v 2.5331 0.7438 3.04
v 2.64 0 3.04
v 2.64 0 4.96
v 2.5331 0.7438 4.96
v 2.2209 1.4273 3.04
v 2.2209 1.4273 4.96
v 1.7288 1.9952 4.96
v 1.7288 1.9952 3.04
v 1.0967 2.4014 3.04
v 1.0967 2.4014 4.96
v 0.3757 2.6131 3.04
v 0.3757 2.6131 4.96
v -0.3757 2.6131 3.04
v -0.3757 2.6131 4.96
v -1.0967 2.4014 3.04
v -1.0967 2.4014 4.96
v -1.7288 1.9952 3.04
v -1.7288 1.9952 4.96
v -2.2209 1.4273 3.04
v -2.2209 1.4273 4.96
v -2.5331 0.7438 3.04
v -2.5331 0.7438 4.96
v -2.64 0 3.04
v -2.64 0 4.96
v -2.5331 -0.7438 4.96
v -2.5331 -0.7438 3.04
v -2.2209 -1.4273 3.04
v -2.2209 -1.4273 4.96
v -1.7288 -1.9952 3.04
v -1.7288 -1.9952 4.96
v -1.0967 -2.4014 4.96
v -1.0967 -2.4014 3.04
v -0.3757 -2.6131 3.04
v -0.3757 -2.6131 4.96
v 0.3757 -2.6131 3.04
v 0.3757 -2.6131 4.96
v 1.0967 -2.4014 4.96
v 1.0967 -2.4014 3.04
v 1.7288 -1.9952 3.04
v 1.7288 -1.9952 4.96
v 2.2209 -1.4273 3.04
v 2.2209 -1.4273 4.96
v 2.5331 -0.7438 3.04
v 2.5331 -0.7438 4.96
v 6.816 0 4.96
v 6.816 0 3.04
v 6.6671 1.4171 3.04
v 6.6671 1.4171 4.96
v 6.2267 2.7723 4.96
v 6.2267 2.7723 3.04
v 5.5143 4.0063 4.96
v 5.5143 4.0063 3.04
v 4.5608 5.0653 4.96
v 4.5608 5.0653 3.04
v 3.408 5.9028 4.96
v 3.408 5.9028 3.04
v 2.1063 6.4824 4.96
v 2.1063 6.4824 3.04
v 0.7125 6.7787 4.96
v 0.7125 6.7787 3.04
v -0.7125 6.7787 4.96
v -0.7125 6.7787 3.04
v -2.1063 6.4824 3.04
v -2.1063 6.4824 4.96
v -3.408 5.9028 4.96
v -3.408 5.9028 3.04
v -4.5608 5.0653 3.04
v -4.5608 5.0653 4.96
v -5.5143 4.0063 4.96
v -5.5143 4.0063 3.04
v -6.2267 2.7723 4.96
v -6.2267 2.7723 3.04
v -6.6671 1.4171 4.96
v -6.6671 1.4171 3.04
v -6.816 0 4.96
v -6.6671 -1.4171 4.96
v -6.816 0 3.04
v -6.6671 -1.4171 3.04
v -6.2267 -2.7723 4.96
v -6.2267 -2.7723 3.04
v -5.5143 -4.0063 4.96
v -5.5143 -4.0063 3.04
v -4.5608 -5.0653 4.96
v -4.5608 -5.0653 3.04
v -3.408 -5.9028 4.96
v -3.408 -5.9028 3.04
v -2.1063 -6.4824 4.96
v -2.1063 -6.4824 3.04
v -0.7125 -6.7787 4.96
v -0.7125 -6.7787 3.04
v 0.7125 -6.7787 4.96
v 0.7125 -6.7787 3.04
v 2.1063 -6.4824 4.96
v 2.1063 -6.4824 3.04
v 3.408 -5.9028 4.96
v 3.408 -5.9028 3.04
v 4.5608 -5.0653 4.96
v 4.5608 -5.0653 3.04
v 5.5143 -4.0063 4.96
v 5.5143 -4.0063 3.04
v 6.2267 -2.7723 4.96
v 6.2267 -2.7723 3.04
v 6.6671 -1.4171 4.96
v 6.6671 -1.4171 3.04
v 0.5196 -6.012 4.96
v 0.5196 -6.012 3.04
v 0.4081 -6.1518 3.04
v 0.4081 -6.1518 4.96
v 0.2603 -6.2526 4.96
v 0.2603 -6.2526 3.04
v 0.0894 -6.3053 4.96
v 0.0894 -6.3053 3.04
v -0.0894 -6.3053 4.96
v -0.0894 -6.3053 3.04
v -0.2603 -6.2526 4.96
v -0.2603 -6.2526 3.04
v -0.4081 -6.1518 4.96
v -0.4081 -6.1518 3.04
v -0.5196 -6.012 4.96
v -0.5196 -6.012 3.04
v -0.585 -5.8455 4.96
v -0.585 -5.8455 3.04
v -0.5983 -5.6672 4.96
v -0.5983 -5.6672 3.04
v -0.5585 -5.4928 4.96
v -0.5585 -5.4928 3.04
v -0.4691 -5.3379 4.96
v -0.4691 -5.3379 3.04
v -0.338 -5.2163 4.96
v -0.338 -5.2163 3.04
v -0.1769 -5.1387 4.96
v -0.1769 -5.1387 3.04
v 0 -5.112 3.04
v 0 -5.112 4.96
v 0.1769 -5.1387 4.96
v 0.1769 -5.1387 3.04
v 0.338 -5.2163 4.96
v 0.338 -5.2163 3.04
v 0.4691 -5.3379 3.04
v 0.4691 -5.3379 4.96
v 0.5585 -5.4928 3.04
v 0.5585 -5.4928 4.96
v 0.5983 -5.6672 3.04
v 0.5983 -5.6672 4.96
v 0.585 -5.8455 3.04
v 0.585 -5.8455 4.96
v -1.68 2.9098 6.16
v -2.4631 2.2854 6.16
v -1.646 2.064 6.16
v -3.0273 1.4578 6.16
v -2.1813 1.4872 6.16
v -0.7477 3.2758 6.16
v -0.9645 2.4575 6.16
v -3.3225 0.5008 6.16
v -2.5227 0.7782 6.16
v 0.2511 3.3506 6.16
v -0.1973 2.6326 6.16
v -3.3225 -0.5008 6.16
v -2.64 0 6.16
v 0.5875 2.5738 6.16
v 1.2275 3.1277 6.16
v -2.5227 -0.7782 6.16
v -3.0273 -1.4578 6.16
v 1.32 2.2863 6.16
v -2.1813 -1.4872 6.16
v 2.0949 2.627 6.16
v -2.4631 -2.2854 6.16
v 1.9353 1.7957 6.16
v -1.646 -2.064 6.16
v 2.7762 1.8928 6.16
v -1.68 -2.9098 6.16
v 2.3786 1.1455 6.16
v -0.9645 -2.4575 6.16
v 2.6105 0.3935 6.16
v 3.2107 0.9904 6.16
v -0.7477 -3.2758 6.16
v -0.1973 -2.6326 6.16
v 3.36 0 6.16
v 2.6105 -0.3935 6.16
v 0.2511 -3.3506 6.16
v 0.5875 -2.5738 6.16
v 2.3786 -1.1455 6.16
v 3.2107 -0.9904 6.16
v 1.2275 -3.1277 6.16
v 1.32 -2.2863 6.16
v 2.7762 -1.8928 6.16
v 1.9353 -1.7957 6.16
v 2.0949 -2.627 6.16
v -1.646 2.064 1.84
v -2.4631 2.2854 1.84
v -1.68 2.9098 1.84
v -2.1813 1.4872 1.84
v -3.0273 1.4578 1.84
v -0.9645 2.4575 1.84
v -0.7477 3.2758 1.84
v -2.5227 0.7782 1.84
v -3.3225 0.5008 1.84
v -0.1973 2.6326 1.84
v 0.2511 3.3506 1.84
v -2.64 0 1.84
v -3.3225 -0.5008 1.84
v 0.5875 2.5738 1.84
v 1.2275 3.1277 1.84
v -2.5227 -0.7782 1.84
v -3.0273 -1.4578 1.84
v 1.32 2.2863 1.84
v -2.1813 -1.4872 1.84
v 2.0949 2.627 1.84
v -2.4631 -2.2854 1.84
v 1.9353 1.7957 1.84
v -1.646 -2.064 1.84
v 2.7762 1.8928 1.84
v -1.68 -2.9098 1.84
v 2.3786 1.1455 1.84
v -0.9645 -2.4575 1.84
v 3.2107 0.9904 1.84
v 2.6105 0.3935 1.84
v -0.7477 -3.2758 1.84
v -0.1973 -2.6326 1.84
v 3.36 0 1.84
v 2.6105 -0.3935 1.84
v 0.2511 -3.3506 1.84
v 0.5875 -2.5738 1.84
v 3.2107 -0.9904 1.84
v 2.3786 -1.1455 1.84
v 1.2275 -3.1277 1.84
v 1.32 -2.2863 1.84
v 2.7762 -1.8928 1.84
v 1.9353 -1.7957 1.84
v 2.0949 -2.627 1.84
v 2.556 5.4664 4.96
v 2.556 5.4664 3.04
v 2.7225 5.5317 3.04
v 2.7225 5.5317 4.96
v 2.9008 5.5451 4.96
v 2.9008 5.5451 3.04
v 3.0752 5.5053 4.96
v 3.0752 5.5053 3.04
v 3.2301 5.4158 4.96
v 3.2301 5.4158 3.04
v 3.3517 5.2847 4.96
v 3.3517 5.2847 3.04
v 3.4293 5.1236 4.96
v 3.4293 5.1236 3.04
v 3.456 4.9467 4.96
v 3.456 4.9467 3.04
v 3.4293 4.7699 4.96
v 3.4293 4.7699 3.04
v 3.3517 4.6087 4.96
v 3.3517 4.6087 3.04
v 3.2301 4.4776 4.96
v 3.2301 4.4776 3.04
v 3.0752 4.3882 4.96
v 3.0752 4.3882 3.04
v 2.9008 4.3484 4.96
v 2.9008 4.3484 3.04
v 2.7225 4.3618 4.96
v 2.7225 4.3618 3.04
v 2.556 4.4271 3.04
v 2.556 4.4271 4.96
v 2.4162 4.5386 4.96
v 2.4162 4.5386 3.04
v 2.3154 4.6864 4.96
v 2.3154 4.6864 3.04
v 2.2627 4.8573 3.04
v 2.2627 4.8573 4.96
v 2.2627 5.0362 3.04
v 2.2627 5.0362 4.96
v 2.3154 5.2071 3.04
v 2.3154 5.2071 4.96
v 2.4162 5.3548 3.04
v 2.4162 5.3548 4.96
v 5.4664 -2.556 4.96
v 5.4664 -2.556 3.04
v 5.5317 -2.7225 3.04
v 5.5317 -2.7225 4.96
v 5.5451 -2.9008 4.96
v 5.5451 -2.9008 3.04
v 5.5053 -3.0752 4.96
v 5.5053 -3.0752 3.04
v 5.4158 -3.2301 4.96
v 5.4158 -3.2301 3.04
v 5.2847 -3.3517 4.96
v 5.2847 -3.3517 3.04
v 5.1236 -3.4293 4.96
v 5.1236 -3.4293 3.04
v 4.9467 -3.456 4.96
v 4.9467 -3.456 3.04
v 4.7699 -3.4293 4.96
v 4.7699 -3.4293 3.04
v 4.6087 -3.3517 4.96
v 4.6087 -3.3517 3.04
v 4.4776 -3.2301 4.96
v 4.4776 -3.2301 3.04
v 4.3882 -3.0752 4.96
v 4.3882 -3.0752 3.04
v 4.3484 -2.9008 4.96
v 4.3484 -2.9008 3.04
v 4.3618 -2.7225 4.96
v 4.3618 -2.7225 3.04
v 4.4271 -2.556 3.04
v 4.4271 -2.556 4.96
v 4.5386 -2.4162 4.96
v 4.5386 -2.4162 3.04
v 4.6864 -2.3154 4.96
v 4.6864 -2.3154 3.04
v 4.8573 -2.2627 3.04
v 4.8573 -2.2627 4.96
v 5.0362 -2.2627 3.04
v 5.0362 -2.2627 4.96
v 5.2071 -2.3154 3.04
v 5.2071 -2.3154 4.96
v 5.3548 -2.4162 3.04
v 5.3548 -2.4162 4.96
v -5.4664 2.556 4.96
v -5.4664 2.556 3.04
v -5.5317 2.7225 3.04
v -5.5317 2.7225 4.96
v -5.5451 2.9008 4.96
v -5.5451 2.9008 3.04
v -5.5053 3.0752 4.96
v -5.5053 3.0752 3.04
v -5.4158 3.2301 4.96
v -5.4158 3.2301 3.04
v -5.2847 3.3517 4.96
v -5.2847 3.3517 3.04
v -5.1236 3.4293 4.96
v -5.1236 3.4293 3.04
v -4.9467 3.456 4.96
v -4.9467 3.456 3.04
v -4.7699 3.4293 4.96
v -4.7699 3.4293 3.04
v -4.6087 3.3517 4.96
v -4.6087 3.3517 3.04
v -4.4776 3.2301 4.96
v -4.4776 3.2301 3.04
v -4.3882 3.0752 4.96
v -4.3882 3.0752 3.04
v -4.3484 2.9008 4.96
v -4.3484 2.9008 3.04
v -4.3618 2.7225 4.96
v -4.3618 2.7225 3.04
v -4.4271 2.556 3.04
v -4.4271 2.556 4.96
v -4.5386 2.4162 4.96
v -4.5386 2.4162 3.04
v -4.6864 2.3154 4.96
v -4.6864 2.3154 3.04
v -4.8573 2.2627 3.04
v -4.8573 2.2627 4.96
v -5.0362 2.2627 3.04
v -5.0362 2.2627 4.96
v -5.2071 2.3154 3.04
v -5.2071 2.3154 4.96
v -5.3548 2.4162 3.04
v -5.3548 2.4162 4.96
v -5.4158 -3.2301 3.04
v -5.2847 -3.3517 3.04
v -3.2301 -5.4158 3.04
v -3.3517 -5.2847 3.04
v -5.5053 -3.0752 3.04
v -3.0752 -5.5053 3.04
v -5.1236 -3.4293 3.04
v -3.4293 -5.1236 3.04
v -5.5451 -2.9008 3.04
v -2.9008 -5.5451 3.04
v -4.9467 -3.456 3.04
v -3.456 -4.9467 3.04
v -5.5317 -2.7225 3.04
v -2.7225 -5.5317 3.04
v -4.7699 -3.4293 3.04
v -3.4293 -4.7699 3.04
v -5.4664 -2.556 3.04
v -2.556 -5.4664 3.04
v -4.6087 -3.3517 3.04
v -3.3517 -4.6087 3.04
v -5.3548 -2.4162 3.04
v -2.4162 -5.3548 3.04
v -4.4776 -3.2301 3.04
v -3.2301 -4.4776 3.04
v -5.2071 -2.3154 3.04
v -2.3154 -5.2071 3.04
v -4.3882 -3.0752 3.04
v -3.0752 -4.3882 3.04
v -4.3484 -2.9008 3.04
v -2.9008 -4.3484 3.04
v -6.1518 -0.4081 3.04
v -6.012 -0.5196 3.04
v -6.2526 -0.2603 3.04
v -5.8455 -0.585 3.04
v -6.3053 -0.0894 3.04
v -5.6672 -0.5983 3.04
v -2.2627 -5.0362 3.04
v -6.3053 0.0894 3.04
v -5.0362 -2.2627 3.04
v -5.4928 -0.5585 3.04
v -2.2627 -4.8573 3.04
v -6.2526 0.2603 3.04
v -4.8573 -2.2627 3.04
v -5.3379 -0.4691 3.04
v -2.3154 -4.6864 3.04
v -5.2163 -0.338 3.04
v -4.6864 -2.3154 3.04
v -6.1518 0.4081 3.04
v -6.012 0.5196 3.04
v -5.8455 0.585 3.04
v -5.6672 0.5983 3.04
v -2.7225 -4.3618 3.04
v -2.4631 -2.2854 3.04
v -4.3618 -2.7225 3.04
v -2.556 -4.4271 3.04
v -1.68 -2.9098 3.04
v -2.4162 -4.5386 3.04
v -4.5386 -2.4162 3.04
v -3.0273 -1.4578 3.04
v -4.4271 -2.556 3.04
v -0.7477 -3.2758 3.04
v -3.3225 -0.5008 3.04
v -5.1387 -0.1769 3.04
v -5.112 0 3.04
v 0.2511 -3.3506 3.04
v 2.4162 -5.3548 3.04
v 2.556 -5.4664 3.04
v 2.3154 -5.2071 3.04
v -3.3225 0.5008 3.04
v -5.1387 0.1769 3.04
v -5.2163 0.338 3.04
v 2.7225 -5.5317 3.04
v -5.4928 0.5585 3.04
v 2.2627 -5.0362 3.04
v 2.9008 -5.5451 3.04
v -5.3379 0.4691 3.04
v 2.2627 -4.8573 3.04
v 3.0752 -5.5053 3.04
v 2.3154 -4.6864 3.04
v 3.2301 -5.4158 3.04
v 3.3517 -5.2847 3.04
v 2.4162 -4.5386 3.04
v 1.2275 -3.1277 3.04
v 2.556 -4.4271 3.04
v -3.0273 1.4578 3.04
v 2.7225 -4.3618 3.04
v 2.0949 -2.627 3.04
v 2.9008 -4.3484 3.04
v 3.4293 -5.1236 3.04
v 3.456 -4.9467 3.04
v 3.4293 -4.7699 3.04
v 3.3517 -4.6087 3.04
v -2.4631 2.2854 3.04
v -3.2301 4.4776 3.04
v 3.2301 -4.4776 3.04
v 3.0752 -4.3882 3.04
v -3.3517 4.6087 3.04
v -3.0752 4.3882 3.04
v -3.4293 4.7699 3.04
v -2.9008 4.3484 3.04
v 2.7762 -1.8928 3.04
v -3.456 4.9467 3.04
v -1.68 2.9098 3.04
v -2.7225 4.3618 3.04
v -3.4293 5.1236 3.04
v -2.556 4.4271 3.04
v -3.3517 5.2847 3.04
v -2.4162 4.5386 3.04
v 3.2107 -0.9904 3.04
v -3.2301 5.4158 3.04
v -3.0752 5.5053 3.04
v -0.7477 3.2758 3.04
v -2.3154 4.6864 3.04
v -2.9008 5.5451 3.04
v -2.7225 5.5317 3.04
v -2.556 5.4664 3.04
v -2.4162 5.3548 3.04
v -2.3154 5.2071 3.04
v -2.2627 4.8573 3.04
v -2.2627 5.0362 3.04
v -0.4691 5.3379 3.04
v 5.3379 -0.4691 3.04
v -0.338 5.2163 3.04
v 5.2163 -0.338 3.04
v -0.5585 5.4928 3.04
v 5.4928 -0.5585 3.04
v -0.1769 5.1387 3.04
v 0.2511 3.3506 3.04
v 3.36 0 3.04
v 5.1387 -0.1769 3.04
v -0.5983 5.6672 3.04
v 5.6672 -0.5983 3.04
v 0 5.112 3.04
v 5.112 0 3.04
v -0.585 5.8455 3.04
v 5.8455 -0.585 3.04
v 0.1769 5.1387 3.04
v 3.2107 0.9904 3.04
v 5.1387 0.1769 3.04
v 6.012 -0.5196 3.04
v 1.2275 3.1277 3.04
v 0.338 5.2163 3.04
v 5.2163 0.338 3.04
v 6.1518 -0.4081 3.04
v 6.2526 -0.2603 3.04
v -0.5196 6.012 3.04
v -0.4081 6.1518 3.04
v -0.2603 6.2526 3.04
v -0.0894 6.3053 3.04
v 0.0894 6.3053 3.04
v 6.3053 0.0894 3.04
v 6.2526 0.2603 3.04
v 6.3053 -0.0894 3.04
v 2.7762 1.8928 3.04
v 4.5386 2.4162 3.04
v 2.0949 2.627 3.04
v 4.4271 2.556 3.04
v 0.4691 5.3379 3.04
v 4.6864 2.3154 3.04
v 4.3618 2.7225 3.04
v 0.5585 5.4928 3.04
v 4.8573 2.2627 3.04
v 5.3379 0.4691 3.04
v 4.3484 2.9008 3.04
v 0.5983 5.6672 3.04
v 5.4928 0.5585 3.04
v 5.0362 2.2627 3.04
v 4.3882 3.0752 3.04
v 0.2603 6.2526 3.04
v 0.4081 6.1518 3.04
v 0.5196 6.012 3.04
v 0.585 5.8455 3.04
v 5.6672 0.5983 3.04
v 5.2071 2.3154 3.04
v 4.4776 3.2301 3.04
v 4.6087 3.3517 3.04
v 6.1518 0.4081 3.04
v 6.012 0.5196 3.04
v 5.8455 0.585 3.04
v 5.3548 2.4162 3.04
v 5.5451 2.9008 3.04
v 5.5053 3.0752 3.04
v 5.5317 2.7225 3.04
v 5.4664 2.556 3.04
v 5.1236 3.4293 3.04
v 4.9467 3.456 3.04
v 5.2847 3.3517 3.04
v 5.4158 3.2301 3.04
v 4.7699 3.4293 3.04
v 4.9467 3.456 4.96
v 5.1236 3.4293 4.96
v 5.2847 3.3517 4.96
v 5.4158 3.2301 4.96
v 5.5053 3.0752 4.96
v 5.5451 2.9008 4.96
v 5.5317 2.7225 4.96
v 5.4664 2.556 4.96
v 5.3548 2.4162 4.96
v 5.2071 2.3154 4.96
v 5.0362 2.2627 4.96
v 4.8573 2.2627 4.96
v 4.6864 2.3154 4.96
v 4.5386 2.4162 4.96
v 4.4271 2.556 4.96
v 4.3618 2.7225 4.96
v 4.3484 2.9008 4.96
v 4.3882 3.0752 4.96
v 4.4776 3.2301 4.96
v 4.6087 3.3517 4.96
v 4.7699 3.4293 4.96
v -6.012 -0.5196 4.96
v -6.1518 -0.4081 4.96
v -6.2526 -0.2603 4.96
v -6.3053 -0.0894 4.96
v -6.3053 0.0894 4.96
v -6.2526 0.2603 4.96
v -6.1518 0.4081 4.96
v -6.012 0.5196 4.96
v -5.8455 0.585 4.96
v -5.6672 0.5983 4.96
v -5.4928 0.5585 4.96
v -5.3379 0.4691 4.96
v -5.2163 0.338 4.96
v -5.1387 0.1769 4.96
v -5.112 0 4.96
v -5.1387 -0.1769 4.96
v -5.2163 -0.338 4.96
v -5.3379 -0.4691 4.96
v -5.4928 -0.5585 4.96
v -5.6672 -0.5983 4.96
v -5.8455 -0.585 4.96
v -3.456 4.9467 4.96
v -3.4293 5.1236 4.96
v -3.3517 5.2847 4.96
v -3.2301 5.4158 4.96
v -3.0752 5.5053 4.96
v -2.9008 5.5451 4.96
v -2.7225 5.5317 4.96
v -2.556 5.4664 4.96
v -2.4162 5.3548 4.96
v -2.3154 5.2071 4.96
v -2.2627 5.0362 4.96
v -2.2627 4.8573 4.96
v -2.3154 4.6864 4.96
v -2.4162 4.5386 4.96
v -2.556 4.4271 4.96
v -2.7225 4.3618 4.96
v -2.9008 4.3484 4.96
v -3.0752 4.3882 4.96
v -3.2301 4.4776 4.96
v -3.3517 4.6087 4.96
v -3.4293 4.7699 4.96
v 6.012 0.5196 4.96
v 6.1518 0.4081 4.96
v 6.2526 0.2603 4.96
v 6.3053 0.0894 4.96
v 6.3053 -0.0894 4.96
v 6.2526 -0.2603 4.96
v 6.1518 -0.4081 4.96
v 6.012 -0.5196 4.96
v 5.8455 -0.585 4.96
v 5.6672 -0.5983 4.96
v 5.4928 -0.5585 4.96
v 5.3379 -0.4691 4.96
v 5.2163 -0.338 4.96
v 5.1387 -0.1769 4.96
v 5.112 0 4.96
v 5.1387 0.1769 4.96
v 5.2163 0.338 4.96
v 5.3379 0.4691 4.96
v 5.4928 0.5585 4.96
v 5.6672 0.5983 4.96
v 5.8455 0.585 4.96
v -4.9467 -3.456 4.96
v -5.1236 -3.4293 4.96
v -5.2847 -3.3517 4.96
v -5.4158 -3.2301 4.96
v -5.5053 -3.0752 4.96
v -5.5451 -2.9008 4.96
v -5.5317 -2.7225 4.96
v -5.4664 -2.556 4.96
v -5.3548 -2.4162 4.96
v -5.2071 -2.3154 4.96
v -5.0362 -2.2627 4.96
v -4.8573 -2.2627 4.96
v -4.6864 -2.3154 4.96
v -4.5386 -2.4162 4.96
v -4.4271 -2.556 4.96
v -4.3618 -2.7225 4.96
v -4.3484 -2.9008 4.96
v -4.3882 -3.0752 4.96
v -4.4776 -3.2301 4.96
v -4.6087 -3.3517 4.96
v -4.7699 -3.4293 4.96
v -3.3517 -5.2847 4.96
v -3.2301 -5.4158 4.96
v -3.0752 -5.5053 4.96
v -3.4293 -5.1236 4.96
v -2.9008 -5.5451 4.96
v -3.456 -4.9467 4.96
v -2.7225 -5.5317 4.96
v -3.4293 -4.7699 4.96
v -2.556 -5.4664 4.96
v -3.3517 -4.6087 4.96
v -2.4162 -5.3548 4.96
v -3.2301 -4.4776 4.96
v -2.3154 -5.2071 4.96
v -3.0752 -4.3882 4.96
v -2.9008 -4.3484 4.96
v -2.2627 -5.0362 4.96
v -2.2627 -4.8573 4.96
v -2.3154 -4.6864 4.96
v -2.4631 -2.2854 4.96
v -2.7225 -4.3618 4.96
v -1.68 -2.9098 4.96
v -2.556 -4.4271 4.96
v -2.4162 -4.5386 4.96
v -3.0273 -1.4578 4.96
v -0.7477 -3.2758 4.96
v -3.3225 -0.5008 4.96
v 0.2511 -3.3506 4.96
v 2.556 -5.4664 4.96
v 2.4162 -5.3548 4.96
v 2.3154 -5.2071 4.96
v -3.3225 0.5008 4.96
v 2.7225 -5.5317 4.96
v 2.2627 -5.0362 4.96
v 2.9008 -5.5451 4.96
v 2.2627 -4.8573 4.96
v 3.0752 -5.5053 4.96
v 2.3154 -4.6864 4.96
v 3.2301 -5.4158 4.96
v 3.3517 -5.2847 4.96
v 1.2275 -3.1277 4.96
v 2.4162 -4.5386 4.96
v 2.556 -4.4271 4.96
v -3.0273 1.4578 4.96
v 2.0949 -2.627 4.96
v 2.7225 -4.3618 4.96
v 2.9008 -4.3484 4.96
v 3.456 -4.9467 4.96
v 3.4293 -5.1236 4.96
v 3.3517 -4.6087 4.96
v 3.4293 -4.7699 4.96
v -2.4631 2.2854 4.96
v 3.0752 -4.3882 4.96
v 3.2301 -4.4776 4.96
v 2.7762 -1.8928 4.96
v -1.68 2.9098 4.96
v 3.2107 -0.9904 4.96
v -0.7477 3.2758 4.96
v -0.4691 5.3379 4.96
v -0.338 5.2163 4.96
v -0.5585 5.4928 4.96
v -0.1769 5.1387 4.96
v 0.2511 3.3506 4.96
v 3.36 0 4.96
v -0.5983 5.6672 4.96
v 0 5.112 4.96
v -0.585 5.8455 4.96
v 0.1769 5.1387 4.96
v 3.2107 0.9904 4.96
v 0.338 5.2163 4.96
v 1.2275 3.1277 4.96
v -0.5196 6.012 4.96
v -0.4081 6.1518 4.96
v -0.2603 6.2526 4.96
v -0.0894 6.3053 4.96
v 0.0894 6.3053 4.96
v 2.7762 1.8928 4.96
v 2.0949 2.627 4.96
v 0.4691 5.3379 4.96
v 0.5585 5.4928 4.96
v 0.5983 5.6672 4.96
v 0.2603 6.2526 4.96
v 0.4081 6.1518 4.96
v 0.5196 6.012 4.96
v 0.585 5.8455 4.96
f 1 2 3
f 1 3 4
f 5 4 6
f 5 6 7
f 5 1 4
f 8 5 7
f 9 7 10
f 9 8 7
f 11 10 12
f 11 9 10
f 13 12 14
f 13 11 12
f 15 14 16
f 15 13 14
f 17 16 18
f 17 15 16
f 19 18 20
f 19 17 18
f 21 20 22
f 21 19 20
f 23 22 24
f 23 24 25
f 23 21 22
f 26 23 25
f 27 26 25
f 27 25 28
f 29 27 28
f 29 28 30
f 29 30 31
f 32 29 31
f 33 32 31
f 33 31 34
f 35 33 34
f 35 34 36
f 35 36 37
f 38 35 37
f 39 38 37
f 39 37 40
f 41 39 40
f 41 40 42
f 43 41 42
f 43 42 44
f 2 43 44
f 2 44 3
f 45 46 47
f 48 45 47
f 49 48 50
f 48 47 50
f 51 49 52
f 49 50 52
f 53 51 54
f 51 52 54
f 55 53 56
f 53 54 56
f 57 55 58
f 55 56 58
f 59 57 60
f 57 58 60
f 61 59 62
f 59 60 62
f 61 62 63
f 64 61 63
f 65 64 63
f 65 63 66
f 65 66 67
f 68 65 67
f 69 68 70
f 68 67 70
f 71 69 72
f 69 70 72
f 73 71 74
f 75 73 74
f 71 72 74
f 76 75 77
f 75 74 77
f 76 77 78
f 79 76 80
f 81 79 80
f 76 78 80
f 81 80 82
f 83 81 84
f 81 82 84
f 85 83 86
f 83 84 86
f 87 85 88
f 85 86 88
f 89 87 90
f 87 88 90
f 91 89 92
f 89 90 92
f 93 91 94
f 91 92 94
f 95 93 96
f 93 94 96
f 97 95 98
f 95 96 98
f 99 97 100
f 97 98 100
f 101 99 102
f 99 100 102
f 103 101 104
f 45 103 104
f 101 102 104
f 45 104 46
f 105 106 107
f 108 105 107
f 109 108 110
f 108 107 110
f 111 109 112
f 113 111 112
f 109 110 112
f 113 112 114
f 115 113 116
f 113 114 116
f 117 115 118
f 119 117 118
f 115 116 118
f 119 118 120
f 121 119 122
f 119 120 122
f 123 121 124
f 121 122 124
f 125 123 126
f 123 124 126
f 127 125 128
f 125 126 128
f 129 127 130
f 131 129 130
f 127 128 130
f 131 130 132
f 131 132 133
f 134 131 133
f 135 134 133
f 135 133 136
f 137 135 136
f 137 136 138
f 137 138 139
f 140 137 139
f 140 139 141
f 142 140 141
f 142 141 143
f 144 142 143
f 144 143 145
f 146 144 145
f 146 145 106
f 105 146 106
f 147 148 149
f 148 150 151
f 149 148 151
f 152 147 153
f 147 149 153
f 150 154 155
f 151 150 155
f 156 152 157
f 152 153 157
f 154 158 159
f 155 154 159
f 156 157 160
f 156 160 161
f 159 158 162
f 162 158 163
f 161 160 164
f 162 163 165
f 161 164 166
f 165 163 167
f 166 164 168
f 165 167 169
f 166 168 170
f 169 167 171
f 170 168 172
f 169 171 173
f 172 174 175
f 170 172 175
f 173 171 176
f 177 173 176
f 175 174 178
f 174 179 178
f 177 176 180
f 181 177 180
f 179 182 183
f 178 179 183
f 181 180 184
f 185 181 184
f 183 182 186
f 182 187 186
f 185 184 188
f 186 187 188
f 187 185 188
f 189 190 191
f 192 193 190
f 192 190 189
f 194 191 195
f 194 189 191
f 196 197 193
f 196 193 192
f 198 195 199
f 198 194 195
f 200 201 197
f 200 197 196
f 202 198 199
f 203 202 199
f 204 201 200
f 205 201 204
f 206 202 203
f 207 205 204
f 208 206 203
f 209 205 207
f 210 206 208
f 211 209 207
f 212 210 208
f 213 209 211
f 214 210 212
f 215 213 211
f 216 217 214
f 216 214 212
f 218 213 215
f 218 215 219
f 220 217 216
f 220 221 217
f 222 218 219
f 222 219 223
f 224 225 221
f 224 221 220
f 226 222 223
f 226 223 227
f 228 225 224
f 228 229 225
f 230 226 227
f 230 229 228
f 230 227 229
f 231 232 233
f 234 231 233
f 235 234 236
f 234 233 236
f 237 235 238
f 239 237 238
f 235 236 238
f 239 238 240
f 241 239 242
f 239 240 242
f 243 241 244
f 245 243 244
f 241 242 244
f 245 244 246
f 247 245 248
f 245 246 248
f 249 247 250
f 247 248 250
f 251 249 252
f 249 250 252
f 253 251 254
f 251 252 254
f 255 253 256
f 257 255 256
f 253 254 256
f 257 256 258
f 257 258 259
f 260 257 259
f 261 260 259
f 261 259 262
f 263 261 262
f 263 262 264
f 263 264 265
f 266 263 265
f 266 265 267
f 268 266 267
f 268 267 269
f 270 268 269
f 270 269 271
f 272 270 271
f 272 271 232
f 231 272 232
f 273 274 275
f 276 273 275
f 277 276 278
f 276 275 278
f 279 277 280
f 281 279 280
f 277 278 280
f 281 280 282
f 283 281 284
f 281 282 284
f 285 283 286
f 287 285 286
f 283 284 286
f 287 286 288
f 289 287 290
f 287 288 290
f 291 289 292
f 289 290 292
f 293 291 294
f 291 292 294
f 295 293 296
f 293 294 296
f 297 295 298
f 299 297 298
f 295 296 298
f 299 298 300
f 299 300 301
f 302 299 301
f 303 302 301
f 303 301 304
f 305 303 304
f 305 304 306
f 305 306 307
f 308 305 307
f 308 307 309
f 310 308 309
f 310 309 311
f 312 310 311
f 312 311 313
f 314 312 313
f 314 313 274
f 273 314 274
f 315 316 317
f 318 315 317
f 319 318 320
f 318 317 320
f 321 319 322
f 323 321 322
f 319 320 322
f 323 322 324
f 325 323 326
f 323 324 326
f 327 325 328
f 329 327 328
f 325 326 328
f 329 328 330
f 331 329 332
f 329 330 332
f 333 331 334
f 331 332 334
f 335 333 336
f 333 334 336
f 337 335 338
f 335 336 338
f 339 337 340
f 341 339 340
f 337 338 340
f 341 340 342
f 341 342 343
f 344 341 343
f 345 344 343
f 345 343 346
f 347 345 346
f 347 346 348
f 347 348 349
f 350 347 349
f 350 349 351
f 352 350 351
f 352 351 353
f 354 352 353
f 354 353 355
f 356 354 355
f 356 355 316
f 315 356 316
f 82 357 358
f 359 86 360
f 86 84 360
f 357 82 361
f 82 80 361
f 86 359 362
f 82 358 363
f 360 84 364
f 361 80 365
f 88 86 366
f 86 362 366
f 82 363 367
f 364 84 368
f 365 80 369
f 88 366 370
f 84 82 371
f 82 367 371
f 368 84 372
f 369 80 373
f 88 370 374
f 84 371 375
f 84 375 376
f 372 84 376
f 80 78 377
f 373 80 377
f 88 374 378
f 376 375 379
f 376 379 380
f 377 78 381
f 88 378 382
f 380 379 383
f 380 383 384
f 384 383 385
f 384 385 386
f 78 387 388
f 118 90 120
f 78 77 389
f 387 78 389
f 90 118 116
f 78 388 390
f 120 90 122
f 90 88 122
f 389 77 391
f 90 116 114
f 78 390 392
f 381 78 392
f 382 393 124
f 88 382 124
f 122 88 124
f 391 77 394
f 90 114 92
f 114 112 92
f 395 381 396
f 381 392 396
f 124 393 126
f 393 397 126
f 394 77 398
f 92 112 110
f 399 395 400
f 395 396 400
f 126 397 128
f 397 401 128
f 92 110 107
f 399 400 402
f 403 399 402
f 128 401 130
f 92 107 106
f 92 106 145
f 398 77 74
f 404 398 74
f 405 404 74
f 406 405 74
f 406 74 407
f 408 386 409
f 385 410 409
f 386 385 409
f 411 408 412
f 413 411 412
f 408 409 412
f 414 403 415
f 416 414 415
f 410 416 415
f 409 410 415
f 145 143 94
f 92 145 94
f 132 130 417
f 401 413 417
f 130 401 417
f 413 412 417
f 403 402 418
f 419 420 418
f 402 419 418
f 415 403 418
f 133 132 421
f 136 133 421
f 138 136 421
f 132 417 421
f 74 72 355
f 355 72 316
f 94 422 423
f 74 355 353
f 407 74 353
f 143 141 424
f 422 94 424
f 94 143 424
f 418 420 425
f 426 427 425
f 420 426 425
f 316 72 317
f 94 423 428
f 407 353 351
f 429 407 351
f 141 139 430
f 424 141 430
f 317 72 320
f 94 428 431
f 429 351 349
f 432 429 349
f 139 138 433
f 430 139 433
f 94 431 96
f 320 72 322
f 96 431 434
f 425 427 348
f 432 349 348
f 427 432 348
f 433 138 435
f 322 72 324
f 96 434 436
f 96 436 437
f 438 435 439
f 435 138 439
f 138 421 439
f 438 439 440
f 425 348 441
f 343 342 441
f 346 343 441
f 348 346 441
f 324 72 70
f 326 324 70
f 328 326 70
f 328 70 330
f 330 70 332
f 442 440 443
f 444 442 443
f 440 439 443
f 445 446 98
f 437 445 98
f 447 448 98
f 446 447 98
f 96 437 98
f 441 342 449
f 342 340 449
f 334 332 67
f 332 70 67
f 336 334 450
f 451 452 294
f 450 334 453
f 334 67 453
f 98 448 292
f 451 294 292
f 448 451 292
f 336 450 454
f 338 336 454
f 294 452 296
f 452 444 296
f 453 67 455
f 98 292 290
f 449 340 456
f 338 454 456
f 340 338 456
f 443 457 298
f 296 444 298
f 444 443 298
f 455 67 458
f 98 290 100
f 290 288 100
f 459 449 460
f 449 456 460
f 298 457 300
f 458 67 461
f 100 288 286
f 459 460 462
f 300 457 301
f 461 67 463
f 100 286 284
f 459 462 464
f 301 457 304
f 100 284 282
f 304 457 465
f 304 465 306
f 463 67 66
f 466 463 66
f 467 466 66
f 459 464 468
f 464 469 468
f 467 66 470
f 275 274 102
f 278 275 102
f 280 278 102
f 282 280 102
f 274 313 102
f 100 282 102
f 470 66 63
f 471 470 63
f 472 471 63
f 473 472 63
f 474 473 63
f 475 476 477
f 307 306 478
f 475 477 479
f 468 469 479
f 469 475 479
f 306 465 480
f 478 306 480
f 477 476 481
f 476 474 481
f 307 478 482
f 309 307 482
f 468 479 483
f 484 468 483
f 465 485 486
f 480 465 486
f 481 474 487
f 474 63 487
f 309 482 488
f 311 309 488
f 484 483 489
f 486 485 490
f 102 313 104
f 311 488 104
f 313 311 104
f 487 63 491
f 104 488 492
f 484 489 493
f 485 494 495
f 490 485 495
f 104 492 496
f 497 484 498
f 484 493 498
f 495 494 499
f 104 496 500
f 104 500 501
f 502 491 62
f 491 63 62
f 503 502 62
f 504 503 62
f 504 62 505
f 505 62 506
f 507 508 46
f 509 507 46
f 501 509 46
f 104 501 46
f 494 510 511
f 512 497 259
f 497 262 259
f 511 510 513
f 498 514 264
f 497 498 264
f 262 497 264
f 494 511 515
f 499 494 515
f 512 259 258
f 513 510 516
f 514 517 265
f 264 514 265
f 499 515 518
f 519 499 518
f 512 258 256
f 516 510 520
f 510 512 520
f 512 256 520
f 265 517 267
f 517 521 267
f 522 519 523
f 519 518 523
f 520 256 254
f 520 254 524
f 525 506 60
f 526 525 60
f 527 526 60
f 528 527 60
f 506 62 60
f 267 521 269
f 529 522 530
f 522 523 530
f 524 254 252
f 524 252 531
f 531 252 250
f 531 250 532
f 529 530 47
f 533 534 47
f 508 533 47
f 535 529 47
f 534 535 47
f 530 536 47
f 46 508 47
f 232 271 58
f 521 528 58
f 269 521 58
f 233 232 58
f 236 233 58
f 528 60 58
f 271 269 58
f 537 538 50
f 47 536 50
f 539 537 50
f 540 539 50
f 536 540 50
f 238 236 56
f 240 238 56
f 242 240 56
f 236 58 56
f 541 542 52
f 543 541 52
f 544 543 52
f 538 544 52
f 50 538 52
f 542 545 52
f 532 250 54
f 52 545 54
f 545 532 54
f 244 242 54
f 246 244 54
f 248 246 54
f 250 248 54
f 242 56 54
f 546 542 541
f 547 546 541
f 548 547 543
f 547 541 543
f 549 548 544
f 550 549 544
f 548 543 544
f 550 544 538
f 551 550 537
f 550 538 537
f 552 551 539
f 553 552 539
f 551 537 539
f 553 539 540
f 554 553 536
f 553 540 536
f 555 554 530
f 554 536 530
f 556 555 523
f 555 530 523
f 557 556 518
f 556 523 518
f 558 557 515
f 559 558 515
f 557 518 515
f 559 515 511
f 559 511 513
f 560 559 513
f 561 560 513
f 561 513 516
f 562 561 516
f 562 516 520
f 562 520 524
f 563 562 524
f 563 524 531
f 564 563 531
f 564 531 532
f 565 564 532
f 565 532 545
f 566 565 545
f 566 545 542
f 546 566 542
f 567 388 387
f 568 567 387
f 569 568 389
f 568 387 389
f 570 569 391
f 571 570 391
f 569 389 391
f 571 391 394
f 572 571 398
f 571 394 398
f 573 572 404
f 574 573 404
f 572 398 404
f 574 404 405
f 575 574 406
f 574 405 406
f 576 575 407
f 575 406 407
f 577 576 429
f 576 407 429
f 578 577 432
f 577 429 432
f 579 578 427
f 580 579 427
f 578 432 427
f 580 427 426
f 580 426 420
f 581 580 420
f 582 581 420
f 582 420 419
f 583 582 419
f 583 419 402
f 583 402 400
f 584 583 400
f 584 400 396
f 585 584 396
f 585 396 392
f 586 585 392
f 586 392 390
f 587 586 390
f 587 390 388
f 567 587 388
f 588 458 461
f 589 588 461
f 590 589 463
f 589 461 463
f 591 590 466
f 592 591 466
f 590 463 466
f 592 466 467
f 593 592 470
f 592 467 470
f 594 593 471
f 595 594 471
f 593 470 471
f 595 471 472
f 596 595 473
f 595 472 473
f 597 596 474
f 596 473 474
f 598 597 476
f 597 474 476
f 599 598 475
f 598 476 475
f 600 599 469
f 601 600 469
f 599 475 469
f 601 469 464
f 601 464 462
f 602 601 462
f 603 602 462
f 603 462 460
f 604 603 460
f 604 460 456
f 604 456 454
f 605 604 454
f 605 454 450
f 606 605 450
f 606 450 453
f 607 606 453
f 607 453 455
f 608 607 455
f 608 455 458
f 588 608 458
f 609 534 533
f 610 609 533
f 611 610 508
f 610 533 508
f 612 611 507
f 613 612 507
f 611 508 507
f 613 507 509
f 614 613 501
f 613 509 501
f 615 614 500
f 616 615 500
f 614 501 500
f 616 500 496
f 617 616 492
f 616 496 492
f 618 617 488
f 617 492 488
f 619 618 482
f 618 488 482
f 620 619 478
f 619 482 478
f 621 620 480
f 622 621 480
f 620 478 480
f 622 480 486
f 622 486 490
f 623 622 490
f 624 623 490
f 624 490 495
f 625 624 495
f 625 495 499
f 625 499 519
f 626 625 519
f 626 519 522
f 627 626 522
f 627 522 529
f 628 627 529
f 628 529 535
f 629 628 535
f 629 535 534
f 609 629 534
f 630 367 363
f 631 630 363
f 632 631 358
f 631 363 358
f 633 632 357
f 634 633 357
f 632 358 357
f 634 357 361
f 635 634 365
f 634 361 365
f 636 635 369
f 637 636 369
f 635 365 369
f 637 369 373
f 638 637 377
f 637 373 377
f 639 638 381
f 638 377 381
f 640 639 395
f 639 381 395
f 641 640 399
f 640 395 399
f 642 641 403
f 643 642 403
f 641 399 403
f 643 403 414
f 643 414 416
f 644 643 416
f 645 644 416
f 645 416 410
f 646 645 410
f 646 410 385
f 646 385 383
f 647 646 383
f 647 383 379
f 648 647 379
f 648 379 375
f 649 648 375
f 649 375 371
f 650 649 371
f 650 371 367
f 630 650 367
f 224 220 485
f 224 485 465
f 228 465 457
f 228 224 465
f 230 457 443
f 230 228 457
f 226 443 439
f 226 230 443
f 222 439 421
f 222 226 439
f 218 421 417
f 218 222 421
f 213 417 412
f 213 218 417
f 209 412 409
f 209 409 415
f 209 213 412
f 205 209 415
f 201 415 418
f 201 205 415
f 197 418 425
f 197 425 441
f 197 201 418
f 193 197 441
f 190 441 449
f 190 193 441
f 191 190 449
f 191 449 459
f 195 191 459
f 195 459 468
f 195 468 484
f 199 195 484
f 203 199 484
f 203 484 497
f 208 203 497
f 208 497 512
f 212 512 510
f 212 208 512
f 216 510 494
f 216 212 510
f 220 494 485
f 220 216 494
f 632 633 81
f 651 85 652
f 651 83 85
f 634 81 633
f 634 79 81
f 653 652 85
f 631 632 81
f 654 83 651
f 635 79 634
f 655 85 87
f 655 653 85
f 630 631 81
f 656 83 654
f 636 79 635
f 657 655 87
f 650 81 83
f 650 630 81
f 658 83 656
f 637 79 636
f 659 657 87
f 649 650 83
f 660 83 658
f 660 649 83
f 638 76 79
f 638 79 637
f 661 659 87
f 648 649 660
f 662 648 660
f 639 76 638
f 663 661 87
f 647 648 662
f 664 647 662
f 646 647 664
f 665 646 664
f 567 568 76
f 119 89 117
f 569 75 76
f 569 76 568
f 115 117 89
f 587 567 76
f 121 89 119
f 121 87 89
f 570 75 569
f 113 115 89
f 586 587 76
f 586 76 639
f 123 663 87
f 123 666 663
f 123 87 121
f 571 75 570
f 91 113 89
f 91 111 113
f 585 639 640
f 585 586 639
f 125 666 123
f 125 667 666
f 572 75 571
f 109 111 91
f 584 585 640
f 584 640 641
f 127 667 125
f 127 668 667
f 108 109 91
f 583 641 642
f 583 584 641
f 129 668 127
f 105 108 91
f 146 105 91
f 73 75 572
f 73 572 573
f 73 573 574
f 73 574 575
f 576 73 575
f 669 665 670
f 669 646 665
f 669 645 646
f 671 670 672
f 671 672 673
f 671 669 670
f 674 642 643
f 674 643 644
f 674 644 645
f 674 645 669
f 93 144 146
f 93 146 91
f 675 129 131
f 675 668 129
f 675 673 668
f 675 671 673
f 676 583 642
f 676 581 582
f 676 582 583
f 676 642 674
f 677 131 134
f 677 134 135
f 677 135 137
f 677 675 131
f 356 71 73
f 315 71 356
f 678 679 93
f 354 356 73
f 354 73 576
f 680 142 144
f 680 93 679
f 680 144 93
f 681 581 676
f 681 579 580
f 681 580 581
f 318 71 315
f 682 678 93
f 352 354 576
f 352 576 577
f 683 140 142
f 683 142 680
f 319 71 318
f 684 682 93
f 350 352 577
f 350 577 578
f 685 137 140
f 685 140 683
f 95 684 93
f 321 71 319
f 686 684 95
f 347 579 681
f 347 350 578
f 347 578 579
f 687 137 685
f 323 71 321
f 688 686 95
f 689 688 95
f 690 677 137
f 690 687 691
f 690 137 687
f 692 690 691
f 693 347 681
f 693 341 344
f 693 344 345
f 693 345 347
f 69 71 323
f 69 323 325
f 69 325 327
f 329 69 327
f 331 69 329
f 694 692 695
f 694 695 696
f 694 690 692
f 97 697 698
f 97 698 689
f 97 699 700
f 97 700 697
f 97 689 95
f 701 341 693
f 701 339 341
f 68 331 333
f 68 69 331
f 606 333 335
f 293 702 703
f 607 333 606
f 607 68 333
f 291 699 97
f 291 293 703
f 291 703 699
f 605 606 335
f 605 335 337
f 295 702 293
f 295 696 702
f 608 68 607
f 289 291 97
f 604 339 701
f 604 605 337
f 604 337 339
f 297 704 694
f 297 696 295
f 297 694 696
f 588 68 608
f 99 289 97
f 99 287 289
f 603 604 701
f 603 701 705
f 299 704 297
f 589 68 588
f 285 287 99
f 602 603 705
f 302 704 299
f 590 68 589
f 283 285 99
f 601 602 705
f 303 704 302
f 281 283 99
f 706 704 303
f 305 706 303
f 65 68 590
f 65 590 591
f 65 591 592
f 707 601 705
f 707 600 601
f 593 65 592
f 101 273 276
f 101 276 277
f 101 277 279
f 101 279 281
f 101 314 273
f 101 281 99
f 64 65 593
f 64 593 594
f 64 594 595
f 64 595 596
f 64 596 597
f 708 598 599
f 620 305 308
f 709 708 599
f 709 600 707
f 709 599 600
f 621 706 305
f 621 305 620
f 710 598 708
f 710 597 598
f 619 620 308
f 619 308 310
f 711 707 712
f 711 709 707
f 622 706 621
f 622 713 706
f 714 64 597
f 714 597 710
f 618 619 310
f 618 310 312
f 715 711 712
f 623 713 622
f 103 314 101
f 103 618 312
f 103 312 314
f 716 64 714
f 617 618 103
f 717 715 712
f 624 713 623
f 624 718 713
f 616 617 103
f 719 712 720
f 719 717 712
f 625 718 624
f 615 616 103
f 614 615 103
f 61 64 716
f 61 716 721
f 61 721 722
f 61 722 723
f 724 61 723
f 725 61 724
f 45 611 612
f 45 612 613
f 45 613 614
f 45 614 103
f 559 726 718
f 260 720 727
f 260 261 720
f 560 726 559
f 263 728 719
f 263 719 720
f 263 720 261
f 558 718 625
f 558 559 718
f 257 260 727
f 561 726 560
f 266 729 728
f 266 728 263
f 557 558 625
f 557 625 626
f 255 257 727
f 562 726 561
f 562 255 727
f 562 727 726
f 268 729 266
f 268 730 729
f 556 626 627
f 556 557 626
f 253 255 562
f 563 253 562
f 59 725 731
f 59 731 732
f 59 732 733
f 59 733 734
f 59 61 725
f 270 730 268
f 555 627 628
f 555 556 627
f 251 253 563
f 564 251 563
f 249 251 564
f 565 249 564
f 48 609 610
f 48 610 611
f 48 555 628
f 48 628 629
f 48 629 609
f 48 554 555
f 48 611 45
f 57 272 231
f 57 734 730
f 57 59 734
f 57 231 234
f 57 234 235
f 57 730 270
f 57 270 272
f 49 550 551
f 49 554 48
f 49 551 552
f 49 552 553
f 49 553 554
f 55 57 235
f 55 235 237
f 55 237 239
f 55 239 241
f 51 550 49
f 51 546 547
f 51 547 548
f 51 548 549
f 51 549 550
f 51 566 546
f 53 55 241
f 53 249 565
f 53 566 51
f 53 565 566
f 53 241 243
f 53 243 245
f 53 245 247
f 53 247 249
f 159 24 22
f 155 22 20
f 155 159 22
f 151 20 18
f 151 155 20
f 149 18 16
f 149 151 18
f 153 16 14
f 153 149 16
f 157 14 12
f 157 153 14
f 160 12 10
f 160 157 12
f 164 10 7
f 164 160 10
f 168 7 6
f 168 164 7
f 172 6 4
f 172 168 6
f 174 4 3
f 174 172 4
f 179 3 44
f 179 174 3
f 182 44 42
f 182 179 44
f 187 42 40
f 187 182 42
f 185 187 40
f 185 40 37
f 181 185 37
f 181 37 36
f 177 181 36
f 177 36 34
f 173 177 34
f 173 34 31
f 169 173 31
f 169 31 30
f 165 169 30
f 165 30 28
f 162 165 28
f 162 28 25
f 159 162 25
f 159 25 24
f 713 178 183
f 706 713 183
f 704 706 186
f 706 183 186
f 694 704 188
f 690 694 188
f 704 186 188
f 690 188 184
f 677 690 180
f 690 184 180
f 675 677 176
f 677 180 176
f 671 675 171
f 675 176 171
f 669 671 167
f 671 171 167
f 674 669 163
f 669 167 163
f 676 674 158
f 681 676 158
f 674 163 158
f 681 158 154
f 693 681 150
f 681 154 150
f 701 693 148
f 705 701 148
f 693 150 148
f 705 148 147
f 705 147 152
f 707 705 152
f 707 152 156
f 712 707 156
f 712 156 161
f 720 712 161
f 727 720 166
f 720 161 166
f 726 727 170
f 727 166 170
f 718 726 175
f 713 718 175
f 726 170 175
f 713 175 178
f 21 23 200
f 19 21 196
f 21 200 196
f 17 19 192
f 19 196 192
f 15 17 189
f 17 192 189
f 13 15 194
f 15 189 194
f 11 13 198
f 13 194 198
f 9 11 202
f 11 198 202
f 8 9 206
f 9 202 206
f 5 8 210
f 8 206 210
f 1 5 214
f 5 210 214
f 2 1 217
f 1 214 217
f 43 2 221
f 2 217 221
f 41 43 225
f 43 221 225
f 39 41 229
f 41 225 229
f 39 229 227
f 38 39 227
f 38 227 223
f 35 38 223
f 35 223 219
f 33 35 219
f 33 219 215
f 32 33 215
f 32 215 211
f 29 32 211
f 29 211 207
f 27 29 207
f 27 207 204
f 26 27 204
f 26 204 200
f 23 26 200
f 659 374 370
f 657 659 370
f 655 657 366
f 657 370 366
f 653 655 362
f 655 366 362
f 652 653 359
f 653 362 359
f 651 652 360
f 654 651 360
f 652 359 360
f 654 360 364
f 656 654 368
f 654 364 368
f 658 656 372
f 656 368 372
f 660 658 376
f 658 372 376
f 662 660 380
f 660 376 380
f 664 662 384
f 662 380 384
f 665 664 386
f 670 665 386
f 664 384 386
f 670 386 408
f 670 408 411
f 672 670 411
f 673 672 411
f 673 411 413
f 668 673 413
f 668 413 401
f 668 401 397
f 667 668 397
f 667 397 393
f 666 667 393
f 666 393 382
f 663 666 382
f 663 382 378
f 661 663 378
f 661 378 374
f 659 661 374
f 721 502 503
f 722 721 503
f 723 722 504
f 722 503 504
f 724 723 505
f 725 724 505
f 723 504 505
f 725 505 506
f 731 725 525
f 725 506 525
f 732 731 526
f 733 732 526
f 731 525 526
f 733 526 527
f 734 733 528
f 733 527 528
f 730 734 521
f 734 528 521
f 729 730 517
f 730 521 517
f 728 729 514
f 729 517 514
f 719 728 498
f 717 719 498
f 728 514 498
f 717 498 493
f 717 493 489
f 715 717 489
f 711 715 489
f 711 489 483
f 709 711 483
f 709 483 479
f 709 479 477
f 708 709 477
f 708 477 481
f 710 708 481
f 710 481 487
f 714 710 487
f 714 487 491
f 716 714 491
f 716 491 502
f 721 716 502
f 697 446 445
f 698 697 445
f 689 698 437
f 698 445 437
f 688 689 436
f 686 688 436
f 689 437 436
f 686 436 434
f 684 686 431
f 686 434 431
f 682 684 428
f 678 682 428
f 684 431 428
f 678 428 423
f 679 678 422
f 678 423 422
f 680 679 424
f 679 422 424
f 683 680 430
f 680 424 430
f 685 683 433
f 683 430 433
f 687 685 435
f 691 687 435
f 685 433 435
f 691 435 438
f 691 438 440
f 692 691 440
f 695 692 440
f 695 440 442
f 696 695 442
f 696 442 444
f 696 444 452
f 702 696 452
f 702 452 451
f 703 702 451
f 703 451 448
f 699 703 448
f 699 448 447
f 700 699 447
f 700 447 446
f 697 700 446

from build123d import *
from build123d.topology import SkipClean

# Parameters (mm, degrees)
SKETCH1_R           = 28.4
SKETCH1_R_2         = 11
BOSS_EXTRUDE1_DEPTH = 8
BOSS_EXTRUDE2_START = 5
SKETCH2_R           = 14
SKETCH2_R_2         = 11
BOSS_EXTRUDE2_DEPTH = 5
SKETCH3_R           = 2.5
CUT_EXTRUDE1_DEPTH  = 43.215163153
CIRPATTERN1_COUNT   = 12
SCALE1_SCALE        = 0.24


with BuildPart() as part:
    # Sketch1 → Boss-Extrude1 (new body)
    with BuildSketch(Plane.XY):
        Circle(SKETCH1_R)
        Circle(SKETCH1_R_2, mode=Mode.SUBTRACT)
    extrude(amount=BOSS_EXTRUDE1_DEPTH)

    # Sketch2 → Boss-Extrude2 (add)
    with SkipClean():  # the faces are left unmerged after this step: merging them gives an invalid solid
        with BuildSketch(Plane(origin=(0, 0, 0), x_dir=(-1, 0, 0), z_dir=(0, 0, -1)).offset(BOSS_EXTRUDE2_START)):
            with Locations(Location((0, 0, 0), (0, 0, 180))):
                Circle(SKETCH2_R)
            Circle(SKETCH2_R_2, mode=Mode.SUBTRACT)
        boss_extrude2 = extrude(amount=-BOSS_EXTRUDE2_DEPTH)

    # Mirror1: Boss-Extrude2 across plane
    add(boss_extrude2.mirror(Plane.XY.offset(4)))

    # Sketch3 → Cut-Extrude1 (cut, through all)
    with BuildSketch(Plane(origin=(0, 0, 0), x_dir=(-1, 0, 0), z_dir=(0, 0, -1))):
        with Locations((11.9, 20.61140461)):
            Circle(SKETCH3_R)
    cut_extrude1 = extrude(amount=-CUT_EXTRUDE1_DEPTH, mode=Mode.SUBTRACT)

    # CirPattern1: Cut-Extrude1 ×12 about axis
    cirpattern1_axis = Axis((0, 0, 0), (0, 0, 1))
    for i in range(1, CIRPATTERN1_COUNT):
        add(cut_extrude1.rotate(cirpattern1_axis, i * 360 / CIRPATTERN1_COUNT), mode=Mode.SUBTRACT)


with BuildPart() as part_1:
    # Scale1: scaled about (0, 0, 4)
    add(part.part.scale(SCALE1_SCALE).moved(Location((0, 0, 3.04))))


solid = part_1.part
